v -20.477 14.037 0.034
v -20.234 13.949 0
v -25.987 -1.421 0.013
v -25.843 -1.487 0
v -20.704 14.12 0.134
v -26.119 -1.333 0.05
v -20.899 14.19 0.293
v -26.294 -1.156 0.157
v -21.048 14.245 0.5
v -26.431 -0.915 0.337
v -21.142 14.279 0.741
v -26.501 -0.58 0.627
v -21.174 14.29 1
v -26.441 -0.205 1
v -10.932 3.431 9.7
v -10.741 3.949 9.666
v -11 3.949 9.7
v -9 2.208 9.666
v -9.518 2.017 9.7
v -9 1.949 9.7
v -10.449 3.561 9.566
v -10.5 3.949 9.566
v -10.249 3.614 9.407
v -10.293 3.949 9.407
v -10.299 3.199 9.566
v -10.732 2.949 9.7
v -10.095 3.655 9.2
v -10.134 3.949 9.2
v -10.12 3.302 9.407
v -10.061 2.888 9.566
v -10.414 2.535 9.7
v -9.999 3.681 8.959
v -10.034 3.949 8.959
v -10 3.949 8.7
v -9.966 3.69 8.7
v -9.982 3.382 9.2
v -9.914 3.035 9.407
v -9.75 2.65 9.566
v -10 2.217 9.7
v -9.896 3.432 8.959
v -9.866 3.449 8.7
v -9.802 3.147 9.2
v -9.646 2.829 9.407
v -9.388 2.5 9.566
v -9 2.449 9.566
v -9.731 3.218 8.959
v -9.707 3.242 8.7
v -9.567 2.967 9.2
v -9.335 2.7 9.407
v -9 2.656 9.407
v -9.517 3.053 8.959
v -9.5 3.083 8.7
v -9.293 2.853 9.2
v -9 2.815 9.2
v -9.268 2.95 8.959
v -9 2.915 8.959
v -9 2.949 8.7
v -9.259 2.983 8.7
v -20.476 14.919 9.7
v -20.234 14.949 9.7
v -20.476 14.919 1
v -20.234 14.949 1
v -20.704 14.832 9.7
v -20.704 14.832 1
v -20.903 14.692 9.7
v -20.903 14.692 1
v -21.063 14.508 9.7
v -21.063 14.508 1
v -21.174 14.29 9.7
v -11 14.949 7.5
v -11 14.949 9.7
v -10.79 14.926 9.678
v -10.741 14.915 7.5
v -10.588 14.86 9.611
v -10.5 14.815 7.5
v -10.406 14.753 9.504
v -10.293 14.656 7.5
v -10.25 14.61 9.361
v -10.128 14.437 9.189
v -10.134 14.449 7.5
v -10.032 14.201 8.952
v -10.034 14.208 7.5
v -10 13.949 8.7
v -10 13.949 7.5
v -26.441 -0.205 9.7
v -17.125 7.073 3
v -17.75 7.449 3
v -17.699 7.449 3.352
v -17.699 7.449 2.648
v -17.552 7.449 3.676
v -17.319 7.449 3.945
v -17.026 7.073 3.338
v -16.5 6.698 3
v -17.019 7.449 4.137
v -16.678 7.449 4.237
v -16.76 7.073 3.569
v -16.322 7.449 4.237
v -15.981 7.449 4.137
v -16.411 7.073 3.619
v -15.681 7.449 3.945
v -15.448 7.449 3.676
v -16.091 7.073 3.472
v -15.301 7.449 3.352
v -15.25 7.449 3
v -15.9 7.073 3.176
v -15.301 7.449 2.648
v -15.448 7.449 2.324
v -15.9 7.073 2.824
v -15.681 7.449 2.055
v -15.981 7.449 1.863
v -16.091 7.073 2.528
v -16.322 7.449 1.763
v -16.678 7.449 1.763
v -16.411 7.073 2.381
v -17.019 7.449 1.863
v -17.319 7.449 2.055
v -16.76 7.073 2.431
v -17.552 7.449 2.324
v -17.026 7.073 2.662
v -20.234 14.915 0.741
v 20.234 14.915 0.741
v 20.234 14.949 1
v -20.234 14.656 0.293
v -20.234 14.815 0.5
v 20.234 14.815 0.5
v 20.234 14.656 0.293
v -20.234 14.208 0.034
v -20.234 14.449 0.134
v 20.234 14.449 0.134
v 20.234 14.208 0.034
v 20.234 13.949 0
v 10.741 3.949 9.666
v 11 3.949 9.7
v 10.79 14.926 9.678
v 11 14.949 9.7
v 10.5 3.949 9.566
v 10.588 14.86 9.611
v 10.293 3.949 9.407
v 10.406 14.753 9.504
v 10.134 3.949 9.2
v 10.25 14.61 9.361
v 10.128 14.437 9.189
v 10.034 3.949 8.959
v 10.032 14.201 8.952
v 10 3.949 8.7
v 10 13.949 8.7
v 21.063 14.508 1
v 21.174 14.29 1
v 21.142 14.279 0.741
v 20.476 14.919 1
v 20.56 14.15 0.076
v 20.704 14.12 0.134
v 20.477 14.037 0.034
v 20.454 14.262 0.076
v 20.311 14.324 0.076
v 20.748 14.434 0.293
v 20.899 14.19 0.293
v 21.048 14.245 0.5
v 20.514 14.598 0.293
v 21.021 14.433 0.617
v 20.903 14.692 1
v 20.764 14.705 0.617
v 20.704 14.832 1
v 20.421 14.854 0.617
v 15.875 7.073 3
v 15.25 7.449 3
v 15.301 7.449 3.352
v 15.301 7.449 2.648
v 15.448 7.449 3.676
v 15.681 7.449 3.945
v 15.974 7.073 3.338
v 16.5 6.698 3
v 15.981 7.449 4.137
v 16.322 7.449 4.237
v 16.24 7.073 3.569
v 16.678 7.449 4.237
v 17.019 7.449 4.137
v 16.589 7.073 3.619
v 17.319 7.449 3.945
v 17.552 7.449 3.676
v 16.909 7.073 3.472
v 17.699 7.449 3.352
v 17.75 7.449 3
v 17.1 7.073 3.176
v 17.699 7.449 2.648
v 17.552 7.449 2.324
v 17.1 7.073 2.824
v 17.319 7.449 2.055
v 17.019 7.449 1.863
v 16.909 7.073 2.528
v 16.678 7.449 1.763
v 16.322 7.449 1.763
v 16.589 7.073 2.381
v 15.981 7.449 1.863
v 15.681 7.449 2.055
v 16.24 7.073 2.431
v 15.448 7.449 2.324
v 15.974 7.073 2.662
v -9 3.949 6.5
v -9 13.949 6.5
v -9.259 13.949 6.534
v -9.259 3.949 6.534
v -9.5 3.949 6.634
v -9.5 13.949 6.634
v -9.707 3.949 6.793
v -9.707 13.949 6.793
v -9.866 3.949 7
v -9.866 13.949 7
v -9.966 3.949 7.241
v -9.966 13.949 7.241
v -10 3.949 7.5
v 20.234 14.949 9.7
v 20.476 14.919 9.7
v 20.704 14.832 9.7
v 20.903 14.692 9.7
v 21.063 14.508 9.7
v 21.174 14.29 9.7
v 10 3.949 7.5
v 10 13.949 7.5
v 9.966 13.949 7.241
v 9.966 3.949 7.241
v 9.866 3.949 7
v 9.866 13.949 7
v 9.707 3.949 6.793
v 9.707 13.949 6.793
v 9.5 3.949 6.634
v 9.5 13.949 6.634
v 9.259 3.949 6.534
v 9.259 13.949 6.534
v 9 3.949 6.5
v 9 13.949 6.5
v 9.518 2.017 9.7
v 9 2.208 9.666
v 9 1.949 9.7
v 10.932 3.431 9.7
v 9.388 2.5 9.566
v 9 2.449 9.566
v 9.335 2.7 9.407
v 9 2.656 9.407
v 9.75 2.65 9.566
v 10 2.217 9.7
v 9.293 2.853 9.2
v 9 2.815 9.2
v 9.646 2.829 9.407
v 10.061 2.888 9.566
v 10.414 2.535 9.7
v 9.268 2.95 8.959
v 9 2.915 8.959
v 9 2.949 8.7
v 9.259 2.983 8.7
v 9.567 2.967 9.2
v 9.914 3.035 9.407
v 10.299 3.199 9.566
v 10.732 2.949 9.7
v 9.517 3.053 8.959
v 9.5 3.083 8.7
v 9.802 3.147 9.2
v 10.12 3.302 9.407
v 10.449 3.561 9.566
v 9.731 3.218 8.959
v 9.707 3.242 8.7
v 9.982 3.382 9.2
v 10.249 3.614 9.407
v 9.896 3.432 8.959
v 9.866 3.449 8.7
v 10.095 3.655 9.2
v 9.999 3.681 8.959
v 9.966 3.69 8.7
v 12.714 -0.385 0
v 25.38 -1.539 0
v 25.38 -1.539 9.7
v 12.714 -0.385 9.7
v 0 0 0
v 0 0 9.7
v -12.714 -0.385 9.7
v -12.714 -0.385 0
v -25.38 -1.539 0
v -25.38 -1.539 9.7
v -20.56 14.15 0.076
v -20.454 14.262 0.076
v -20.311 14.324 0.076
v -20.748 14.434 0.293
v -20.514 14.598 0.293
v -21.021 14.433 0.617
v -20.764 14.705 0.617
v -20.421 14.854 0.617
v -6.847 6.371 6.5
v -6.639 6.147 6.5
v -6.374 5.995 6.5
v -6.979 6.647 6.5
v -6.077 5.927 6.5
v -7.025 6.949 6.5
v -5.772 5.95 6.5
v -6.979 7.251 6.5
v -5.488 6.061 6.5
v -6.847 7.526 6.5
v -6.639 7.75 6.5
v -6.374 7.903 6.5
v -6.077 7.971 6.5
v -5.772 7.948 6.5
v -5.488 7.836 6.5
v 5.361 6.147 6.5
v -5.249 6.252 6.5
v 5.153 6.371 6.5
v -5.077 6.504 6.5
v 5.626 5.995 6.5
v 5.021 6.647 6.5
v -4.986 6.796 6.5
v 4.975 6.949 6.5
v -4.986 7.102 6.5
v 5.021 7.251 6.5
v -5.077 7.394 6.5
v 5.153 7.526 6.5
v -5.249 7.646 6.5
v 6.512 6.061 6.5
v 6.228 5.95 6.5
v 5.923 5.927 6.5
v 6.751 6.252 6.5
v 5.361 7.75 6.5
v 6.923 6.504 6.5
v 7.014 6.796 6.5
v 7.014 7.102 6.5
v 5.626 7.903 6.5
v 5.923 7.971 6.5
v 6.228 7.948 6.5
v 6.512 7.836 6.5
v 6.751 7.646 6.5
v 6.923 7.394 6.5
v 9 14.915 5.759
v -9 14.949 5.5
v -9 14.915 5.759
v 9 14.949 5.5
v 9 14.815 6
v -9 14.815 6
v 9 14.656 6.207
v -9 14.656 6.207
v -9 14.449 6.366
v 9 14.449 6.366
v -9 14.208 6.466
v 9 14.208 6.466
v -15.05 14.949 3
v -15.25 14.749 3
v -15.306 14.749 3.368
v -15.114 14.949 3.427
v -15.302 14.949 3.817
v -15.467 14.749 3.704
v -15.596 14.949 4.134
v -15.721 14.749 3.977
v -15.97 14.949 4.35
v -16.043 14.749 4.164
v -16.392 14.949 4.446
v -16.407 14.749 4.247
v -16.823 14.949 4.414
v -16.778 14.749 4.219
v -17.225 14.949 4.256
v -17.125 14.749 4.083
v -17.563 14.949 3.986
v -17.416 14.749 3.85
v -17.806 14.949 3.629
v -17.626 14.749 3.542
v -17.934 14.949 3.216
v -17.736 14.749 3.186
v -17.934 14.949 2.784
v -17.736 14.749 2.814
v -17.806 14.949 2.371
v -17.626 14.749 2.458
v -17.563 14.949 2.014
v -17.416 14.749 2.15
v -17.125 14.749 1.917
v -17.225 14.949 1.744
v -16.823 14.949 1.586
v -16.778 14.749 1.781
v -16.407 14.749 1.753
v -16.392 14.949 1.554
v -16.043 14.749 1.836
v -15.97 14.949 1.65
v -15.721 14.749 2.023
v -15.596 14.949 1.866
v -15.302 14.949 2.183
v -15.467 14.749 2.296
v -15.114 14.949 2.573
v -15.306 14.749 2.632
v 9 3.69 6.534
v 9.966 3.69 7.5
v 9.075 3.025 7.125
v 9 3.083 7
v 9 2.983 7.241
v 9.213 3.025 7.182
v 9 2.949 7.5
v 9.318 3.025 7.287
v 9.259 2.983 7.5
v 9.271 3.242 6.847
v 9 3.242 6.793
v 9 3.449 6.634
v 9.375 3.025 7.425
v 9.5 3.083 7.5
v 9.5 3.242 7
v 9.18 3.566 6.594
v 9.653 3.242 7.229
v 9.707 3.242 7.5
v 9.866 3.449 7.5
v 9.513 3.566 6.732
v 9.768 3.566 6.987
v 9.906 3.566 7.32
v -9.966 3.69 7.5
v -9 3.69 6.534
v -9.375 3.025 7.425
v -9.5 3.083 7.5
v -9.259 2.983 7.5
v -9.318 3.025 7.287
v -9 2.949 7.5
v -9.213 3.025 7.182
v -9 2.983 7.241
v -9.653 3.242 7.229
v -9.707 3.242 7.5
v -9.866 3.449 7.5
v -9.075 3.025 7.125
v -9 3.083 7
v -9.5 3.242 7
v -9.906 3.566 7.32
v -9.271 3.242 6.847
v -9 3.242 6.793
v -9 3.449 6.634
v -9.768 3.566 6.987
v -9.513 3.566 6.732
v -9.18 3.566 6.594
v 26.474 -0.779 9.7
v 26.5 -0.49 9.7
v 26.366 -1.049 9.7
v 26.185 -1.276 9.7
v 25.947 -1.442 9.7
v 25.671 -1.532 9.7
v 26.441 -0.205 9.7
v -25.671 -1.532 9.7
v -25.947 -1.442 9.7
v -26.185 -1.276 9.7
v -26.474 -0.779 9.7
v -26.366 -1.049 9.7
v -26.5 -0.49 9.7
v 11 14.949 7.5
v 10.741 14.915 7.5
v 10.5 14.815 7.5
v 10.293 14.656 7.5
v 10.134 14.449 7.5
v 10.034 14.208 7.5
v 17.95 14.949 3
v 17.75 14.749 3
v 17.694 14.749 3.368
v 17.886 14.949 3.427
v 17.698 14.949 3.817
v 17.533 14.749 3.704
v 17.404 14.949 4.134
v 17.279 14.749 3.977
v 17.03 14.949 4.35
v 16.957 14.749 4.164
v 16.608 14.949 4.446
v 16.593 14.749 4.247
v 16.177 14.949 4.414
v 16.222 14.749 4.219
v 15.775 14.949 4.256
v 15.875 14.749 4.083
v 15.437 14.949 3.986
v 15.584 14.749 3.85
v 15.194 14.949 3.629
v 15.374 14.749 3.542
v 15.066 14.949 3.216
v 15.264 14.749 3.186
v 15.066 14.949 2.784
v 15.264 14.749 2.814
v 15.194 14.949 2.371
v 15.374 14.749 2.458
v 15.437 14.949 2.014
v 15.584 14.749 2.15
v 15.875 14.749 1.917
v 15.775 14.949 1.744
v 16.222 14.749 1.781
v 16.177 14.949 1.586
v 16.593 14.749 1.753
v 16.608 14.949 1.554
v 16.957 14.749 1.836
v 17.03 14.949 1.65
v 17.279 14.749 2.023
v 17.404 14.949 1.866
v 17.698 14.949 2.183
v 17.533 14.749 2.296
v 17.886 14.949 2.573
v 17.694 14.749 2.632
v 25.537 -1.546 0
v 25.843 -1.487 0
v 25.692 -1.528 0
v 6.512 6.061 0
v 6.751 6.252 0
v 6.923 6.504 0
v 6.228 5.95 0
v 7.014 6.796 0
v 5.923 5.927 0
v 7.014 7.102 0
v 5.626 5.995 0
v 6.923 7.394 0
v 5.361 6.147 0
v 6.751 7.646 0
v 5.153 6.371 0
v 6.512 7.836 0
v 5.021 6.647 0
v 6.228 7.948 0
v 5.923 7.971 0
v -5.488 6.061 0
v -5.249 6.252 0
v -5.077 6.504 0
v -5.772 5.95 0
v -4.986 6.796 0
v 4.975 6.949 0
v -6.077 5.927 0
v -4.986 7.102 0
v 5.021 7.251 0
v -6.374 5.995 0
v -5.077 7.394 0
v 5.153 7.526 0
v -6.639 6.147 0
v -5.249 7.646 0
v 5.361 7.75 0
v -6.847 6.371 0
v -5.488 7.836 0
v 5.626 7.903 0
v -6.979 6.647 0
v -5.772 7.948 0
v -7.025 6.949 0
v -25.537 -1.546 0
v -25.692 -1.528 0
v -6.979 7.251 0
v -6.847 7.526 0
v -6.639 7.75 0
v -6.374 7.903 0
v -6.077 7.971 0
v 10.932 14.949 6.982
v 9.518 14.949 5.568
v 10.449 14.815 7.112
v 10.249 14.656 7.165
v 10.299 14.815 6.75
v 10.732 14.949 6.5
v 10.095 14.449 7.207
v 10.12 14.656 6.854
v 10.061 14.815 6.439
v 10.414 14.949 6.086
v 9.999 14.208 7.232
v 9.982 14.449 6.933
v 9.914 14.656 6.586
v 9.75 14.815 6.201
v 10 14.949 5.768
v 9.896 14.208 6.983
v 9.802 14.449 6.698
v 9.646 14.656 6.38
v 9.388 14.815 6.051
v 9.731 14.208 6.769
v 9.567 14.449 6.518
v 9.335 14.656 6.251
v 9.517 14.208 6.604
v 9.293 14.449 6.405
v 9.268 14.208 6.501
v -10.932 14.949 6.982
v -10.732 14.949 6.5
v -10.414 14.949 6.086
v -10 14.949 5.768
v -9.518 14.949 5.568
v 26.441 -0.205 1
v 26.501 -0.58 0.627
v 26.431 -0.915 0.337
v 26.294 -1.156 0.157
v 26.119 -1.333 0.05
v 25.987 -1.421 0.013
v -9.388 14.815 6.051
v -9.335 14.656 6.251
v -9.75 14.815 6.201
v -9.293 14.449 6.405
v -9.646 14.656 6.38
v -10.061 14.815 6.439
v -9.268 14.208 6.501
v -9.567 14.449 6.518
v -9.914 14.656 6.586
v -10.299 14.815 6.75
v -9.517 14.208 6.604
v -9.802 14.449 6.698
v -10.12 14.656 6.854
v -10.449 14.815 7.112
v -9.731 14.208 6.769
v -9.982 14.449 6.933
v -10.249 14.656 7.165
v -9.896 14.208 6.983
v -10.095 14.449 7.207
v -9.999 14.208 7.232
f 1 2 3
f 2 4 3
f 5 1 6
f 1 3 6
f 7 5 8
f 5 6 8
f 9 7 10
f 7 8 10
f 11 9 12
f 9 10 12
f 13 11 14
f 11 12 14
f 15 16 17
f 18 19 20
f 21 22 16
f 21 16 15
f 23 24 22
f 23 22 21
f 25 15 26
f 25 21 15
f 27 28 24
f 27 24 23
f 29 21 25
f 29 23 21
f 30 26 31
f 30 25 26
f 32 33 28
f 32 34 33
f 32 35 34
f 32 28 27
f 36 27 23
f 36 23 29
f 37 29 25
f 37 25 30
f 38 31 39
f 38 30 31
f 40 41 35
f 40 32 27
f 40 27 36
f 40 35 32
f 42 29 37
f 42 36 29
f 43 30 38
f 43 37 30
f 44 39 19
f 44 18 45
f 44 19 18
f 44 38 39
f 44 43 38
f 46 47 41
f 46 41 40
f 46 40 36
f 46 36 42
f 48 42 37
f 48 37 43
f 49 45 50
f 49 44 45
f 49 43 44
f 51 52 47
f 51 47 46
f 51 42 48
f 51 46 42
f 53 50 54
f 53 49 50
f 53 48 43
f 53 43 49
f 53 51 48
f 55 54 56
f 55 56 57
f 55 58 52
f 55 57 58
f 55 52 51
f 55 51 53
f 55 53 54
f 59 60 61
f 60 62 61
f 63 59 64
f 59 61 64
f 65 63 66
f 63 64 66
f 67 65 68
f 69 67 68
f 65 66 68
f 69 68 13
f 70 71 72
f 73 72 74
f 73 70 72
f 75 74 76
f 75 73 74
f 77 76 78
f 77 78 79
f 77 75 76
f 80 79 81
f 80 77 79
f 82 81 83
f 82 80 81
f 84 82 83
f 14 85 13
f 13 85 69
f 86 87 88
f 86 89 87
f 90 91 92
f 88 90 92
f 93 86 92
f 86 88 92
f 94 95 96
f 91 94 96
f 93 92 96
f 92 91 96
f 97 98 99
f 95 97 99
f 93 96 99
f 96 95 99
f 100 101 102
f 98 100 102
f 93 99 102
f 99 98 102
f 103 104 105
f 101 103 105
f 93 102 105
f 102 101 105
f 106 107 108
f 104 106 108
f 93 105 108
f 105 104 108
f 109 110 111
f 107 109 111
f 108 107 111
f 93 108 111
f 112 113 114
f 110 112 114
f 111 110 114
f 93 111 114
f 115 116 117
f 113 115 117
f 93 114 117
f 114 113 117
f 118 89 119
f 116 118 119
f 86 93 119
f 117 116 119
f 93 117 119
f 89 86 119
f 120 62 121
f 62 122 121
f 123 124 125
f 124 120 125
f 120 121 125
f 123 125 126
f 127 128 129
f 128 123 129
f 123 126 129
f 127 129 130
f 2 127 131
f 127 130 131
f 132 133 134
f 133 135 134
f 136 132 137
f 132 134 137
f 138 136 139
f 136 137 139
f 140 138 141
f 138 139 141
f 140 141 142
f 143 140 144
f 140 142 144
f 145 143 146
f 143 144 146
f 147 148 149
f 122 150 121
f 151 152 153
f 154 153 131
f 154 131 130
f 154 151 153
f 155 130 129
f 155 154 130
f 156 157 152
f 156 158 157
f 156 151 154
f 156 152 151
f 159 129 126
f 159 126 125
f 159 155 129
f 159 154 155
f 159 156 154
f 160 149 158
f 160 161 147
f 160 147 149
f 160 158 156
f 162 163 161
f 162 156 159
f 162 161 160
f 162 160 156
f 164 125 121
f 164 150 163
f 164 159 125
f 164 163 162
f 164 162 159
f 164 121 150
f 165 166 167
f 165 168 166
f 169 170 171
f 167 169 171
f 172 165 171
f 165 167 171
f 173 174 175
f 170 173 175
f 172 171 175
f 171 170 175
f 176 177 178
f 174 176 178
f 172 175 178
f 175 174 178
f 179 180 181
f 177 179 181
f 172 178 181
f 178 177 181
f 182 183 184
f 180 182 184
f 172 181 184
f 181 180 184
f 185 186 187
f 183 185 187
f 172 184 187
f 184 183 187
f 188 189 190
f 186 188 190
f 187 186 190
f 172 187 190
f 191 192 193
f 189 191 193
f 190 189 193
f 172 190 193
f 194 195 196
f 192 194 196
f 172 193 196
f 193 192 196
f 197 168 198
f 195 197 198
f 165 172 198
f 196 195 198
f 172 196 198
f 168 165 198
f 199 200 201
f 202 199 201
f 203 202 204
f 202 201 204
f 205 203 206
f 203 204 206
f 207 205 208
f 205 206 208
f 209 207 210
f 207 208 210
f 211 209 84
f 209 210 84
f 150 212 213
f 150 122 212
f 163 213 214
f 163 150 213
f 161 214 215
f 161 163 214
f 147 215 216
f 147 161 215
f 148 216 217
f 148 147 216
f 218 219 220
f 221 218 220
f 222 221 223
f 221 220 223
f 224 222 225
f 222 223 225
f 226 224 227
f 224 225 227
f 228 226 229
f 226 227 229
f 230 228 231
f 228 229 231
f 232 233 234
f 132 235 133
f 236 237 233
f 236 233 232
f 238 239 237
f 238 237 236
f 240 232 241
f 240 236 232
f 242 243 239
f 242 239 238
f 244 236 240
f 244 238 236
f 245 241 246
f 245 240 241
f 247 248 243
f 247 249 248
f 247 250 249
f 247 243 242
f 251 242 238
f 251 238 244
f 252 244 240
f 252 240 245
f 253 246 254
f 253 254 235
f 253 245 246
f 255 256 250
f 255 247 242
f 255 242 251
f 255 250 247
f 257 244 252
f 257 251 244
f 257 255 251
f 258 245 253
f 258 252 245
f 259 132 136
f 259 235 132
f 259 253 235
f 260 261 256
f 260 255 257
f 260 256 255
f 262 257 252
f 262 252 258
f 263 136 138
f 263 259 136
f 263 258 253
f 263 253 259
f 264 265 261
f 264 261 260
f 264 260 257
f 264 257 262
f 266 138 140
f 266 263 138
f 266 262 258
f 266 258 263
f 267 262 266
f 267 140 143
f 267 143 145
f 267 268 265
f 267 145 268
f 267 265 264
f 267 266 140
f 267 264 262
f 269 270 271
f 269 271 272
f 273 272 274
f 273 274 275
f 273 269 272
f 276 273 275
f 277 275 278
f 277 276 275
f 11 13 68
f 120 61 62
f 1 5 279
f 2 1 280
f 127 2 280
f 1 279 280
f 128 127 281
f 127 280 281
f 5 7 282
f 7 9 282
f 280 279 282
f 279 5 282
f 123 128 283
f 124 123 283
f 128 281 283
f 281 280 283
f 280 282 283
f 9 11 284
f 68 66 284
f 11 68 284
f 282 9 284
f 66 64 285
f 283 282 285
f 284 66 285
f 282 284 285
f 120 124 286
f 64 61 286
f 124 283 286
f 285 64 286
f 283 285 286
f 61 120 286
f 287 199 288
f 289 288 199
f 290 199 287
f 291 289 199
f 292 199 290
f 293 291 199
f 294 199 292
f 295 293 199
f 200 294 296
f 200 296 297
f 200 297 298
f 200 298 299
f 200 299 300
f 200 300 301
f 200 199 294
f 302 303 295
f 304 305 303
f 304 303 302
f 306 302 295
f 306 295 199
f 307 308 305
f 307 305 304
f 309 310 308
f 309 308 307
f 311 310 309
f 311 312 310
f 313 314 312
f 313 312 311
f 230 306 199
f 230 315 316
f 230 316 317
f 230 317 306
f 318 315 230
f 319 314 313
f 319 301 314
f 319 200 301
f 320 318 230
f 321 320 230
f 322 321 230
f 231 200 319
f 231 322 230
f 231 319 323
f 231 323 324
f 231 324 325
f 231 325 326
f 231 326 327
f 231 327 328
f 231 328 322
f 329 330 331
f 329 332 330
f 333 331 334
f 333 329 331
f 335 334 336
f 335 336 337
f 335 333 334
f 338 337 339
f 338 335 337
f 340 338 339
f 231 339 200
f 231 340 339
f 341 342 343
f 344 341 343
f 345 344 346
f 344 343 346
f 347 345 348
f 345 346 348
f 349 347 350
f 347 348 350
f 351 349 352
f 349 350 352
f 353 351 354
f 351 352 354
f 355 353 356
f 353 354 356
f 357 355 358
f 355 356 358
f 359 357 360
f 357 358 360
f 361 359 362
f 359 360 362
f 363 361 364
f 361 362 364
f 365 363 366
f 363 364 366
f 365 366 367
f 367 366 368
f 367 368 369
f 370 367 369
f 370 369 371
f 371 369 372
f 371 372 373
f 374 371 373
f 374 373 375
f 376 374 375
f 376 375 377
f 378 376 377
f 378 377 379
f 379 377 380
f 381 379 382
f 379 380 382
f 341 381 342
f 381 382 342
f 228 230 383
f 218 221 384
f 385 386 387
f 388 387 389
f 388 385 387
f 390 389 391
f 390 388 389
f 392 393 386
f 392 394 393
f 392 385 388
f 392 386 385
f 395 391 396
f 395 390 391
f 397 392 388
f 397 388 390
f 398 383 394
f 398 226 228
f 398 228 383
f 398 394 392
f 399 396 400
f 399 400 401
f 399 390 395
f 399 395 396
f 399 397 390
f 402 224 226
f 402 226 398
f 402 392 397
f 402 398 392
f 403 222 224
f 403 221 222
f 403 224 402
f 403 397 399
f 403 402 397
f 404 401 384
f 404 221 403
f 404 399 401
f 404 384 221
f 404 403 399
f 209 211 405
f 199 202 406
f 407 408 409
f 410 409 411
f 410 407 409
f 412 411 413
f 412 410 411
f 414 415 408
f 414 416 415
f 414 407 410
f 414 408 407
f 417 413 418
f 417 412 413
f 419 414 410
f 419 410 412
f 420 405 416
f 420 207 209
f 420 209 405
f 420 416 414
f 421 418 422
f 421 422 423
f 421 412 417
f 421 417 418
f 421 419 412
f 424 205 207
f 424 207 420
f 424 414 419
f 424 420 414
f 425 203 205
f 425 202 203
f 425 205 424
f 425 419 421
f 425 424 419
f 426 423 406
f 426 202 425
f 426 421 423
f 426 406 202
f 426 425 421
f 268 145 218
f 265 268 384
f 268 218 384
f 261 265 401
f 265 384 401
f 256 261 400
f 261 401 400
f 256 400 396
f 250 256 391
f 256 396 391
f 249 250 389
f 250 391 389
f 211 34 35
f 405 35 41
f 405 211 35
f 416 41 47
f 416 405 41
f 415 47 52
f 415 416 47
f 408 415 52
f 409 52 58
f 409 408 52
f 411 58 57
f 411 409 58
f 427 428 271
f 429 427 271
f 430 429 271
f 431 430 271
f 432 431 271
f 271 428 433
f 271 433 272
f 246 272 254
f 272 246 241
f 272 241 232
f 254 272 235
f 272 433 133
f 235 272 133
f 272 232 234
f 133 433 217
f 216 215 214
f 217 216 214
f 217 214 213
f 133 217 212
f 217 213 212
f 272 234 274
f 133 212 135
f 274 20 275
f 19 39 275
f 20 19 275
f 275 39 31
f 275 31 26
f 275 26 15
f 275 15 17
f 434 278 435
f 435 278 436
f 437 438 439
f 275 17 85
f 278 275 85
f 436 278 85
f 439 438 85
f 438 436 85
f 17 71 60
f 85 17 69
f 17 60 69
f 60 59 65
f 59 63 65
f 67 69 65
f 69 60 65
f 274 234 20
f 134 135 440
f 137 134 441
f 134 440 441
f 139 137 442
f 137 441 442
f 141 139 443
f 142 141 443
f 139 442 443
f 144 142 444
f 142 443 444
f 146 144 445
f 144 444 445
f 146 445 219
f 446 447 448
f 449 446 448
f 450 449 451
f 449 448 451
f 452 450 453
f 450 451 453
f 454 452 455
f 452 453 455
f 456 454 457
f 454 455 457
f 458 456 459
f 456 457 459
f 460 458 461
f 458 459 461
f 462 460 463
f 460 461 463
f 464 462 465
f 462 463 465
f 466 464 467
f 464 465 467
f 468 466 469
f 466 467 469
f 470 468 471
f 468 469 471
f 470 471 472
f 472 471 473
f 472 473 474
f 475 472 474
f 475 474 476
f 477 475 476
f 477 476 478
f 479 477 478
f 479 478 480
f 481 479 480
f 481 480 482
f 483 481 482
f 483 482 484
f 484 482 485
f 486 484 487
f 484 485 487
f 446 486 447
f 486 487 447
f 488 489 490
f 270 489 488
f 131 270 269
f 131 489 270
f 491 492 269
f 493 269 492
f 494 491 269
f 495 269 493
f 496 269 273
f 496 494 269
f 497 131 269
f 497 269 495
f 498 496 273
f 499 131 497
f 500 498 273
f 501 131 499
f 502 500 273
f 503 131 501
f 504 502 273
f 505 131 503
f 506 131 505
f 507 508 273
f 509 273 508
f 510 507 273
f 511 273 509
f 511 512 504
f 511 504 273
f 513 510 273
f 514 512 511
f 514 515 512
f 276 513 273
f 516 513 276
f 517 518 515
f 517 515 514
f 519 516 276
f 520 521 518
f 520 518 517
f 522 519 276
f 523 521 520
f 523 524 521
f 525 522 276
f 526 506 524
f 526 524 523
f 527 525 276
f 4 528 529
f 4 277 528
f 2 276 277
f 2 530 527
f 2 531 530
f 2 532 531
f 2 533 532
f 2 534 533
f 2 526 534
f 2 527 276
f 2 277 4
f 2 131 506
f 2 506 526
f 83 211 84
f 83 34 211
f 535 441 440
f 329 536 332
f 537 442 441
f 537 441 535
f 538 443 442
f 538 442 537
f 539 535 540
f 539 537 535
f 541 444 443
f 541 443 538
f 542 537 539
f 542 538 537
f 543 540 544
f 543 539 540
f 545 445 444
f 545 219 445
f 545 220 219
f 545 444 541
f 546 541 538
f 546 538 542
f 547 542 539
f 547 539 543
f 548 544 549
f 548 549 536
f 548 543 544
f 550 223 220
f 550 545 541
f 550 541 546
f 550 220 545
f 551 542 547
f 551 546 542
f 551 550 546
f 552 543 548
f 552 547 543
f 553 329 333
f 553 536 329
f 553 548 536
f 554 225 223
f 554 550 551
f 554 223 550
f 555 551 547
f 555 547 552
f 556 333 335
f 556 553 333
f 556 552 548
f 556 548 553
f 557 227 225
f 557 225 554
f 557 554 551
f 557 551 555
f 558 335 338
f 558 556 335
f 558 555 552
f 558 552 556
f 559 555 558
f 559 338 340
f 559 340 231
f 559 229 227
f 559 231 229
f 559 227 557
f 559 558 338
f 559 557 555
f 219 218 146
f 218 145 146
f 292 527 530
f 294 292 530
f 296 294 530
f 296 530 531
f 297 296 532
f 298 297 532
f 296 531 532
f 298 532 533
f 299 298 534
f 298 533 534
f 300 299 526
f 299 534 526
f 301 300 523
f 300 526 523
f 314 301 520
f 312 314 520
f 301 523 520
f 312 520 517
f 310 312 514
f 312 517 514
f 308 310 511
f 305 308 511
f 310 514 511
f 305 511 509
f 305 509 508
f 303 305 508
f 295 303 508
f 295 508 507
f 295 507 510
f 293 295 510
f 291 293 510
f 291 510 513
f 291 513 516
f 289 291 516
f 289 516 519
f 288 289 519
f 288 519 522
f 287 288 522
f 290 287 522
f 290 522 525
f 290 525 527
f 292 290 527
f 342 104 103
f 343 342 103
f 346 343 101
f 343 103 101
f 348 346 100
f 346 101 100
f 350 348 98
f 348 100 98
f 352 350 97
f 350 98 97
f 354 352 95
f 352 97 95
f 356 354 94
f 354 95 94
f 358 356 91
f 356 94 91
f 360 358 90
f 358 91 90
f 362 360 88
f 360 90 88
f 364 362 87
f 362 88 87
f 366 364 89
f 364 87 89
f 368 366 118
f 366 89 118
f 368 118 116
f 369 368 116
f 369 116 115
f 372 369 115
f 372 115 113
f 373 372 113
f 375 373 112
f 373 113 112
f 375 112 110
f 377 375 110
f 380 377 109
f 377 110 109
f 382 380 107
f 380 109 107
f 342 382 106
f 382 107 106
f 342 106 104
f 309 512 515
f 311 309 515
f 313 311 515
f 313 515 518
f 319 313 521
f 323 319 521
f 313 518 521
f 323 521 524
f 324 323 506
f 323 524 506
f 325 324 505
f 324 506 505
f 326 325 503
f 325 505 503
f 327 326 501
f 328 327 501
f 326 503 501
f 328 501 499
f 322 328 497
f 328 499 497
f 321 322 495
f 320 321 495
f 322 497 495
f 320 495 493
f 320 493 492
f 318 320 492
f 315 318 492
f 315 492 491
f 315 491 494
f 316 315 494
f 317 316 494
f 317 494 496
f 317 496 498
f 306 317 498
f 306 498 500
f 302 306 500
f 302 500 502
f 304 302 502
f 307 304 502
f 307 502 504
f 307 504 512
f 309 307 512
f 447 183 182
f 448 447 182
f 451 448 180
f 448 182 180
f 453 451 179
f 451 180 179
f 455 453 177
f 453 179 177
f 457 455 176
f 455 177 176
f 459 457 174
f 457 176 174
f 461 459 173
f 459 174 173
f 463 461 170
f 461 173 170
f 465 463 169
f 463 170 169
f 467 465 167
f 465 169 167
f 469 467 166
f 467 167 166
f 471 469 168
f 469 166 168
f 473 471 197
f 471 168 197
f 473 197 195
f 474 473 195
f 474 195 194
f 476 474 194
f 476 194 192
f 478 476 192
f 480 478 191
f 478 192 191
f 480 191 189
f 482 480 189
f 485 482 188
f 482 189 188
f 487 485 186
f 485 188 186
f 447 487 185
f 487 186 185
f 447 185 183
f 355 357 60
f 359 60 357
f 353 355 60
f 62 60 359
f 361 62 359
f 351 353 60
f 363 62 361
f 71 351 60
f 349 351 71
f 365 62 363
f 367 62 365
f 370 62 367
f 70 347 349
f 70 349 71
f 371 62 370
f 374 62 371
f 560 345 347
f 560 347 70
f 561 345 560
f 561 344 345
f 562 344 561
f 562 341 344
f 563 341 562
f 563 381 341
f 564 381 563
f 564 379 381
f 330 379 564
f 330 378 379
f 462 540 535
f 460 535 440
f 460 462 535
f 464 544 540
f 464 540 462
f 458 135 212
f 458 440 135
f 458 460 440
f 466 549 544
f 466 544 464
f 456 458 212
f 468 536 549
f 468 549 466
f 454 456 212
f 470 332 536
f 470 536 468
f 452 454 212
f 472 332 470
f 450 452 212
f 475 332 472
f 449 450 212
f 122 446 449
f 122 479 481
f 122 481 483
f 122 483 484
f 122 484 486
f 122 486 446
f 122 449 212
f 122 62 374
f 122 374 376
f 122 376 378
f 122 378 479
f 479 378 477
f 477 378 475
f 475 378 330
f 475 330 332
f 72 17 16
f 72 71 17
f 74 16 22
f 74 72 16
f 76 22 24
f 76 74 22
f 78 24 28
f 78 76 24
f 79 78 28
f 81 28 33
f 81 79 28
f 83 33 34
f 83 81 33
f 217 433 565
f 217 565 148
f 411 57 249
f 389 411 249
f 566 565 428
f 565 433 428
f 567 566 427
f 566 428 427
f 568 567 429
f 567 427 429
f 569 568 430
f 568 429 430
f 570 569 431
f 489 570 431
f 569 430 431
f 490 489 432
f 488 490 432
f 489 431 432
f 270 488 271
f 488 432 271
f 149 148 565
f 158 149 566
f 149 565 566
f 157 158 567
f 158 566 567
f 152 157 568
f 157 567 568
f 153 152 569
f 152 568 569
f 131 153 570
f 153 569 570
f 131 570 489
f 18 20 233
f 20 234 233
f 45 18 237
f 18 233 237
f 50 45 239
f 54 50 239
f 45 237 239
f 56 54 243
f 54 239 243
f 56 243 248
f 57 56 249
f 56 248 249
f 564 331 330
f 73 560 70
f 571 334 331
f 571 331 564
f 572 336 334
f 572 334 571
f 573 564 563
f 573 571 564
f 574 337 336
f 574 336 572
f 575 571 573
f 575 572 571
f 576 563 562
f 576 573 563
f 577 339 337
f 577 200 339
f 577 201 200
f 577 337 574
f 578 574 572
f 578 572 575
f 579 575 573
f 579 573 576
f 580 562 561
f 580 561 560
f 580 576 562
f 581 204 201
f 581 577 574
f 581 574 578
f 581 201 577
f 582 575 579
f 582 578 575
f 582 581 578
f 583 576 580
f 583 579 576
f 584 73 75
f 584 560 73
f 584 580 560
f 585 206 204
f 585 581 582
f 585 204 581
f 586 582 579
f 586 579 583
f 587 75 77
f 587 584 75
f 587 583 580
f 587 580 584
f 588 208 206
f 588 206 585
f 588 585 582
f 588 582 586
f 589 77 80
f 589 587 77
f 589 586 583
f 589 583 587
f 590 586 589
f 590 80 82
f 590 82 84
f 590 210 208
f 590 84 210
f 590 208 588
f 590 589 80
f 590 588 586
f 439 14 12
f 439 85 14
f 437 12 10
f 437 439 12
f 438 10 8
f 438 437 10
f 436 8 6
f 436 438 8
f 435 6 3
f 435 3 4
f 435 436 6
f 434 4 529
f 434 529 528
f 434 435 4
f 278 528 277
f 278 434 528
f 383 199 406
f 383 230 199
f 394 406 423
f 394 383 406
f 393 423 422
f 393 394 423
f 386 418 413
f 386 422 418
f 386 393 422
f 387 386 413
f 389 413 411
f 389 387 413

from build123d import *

# Parameters (mm, degrees)
SKETCH_1_R               = 0.5
EXTRUDE_1_DEPTH          = 9.7
HOLE_WIZARD_M3_1_D       = 2.5
HOLE_WIZARD_M3_1_DEPTH   = 7.5
HOLE_WIZARD_M3_1_TIP     = 0.751075774
CUT_EXTRUDE_2_DEPTH      = 33.35053134
CHAMFER_1_SIZE           = 0.5
CHAMFER_2_SIZE           = 0.2
SKETCH_11_W              = 20
SKETCH_11_H              = 12
CUT_EXTRUDE_3_DEPTH      = 3.2
FILLET_2_R               = 1
FILLET_3_R               = 1
HOLE_WIZARD_M2_5_3_D     = 2.05
HOLE_WIZARD_M2_5_3_DEPTH = 8.35
HOLE_WIZARD_M2_5_3_TIP   = 0.615882135


with BuildPart() as part:
    # 草图1 → 凸台-拉伸1 (new body)
    with BuildSketch(Plane.XY):
        with BuildLine():
            Line((-22, 14.94880858), (22, 14.94880858))
            Line((22, 14.94880858), (24.5, 14.94880858))
            Line((24.5, 14.94880858), (27, -1.742947298))
            ThreePointArc((27, -1.742947298), (0, 0), (-27, -1.742947298))
            Line((-27, -1.742947298), (-24.5, 14.94880858))
            Line((-24.5, 14.94880858), (-22, 14.94880858))
        make_face()
        with Locations((-6, 6.94880858)):
            Circle(SKETCH_1_R, mode=Mode.SUBTRACT)
        with Locations((6, 6.94880858)):
            Circle(SKETCH_1_R, mode=Mode.SUBTRACT)
    extrude(amount=EXTRUDE_1_DEPTH)

    # M3 螺纹孔1
    with Locations(Plane(origin=(0, 14.94880858, 0), x_dir=(-1, 0, 0), z_dir=(0, 1, 0))):
        with Locations((-16.5, 3), (16.5, 3)):
            Hole(HOLE_WIZARD_M3_1_D / 2, depth=HOLE_WIZARD_M3_1_DEPTH)
            with Locations((0, 0, -(HOLE_WIZARD_M3_1_DEPTH + HOLE_WIZARD_M3_1_TIP / 2))):  # 118° drill point
                Cone(0, HOLE_WIZARD_M3_1_D / 2, HOLE_WIZARD_M3_1_TIP, mode=Mode.SUBTRACT)

    # 草图10 → 切除-拉伸2 (cut, through all)
    with BuildSketch(Plane.XY.offset(9.7)):
        Polygon((27, -1.742947298), (20.914837438, 15.00313582), (24.5, 14.94880858), align=None)
    cut_extrude_2 = extrude(amount=-CUT_EXTRUDE_2_DEPTH, mode=Mode.SUBTRACT)

    # 镜向1: 切除-拉伸2 across plane
    add(cut_extrude_2.mirror(Plane(origin=(0, 0, 0), x_dir=(0, 0, 1), z_dir=(1, 0, 0))), mode=Mode.SUBTRACT)

    # 倒角1
    chamfer_1_edges = [part.edges().sort_by_distance(p)[0] for p in [
        (-6.5, 6.94880858, 0),
        (-6.5, 6.94880858, 9.7),
        (5.5, 6.94880858, 0),
        (5.5, 6.94880858, 9.7),
    ]]
    chamfer(chamfer_1_edges, length=CHAMFER_1_SIZE)

    # 倒角2
    chamfer_2_edges = [part.edges().sort_by_distance(p)[0] for p in [
        (-17.75, 14.94880858, 3),
        (15.25, 14.94880858, 3),
    ]]
    chamfer(chamfer_2_edges, length=CHAMFER_2_SIZE)

    # 草图11 → 切除-拉伸3 (cut)
    with BuildSketch(Plane.XY.offset(9.7)):
        with Locations((0, 8.94880858)):
            Rectangle(SKETCH_11_W, SKETCH_11_H)
    extrude(amount=-CUT_EXTRUDE_3_DEPTH, mode=Mode.SUBTRACT)

    # 圆角2
    fillet_2_edges = [part.edges().sort_by_distance(p)[0] for p in [
        (-10, 8.94880858, 6.5),
        (-10, 2.94880858, 8.1),
        (0, 14.94880858, 6.5),
        (-10, 14.94880858, 8.1),
        (10, 8.94880858, 6.5),
        (10, 14.94880858, 8.1),
        (0, 2.94880858, 6.5),
        (10, 2.94880858, 8.1),
        (-10, 8.94880858, 9.7),
        (0, 2.94880858, 9.7),
        (10, 8.94880858, 9.7),
    ]]
    fillet(fillet_2_edges, radius=FILLET_2_R)

    # 圆角3
    fillet_3_edges = [part.edges().sort_by_distance(p)[0] for p in [
        (27, -1.742947298, 4.85),
        (-27, -1.742947298, 4.85),
        (0, 14.94880858, 0),
        (20.934578776, 14.94880858, 4.85),
        (23.967289388, 6.602930641, 0),
        (-20.934578776, 14.94880858, 4.85),
        (-23.967289388, 6.602930641, 0),
    ]]
    fillet(fillet_3_edges, radius=FILLET_3_R)

    # M2.5 螺纹孔3
    with Locations(Plane(origin=(6, 6.94880858, 6.5), x_dir=(1, 0, 0), z_dir=(0, 0, 1))):
        with Locations((0, 0), (-12, 0)):
            Hole(HOLE_WIZARD_M2_5_3_D / 2, depth=HOLE_WIZARD_M2_5_3_DEPTH)
            with Locations((0, 0, -(HOLE_WIZARD_M2_5_3_DEPTH + HOLE_WIZARD_M2_5_3_TIP / 2))):  # 118° drill point
                Cone(0, HOLE_WIZARD_M2_5_3_D / 2, HOLE_WIZARD_M2_5_3_TIP, mode=Mode.SUBTRACT)


solid = part.part
